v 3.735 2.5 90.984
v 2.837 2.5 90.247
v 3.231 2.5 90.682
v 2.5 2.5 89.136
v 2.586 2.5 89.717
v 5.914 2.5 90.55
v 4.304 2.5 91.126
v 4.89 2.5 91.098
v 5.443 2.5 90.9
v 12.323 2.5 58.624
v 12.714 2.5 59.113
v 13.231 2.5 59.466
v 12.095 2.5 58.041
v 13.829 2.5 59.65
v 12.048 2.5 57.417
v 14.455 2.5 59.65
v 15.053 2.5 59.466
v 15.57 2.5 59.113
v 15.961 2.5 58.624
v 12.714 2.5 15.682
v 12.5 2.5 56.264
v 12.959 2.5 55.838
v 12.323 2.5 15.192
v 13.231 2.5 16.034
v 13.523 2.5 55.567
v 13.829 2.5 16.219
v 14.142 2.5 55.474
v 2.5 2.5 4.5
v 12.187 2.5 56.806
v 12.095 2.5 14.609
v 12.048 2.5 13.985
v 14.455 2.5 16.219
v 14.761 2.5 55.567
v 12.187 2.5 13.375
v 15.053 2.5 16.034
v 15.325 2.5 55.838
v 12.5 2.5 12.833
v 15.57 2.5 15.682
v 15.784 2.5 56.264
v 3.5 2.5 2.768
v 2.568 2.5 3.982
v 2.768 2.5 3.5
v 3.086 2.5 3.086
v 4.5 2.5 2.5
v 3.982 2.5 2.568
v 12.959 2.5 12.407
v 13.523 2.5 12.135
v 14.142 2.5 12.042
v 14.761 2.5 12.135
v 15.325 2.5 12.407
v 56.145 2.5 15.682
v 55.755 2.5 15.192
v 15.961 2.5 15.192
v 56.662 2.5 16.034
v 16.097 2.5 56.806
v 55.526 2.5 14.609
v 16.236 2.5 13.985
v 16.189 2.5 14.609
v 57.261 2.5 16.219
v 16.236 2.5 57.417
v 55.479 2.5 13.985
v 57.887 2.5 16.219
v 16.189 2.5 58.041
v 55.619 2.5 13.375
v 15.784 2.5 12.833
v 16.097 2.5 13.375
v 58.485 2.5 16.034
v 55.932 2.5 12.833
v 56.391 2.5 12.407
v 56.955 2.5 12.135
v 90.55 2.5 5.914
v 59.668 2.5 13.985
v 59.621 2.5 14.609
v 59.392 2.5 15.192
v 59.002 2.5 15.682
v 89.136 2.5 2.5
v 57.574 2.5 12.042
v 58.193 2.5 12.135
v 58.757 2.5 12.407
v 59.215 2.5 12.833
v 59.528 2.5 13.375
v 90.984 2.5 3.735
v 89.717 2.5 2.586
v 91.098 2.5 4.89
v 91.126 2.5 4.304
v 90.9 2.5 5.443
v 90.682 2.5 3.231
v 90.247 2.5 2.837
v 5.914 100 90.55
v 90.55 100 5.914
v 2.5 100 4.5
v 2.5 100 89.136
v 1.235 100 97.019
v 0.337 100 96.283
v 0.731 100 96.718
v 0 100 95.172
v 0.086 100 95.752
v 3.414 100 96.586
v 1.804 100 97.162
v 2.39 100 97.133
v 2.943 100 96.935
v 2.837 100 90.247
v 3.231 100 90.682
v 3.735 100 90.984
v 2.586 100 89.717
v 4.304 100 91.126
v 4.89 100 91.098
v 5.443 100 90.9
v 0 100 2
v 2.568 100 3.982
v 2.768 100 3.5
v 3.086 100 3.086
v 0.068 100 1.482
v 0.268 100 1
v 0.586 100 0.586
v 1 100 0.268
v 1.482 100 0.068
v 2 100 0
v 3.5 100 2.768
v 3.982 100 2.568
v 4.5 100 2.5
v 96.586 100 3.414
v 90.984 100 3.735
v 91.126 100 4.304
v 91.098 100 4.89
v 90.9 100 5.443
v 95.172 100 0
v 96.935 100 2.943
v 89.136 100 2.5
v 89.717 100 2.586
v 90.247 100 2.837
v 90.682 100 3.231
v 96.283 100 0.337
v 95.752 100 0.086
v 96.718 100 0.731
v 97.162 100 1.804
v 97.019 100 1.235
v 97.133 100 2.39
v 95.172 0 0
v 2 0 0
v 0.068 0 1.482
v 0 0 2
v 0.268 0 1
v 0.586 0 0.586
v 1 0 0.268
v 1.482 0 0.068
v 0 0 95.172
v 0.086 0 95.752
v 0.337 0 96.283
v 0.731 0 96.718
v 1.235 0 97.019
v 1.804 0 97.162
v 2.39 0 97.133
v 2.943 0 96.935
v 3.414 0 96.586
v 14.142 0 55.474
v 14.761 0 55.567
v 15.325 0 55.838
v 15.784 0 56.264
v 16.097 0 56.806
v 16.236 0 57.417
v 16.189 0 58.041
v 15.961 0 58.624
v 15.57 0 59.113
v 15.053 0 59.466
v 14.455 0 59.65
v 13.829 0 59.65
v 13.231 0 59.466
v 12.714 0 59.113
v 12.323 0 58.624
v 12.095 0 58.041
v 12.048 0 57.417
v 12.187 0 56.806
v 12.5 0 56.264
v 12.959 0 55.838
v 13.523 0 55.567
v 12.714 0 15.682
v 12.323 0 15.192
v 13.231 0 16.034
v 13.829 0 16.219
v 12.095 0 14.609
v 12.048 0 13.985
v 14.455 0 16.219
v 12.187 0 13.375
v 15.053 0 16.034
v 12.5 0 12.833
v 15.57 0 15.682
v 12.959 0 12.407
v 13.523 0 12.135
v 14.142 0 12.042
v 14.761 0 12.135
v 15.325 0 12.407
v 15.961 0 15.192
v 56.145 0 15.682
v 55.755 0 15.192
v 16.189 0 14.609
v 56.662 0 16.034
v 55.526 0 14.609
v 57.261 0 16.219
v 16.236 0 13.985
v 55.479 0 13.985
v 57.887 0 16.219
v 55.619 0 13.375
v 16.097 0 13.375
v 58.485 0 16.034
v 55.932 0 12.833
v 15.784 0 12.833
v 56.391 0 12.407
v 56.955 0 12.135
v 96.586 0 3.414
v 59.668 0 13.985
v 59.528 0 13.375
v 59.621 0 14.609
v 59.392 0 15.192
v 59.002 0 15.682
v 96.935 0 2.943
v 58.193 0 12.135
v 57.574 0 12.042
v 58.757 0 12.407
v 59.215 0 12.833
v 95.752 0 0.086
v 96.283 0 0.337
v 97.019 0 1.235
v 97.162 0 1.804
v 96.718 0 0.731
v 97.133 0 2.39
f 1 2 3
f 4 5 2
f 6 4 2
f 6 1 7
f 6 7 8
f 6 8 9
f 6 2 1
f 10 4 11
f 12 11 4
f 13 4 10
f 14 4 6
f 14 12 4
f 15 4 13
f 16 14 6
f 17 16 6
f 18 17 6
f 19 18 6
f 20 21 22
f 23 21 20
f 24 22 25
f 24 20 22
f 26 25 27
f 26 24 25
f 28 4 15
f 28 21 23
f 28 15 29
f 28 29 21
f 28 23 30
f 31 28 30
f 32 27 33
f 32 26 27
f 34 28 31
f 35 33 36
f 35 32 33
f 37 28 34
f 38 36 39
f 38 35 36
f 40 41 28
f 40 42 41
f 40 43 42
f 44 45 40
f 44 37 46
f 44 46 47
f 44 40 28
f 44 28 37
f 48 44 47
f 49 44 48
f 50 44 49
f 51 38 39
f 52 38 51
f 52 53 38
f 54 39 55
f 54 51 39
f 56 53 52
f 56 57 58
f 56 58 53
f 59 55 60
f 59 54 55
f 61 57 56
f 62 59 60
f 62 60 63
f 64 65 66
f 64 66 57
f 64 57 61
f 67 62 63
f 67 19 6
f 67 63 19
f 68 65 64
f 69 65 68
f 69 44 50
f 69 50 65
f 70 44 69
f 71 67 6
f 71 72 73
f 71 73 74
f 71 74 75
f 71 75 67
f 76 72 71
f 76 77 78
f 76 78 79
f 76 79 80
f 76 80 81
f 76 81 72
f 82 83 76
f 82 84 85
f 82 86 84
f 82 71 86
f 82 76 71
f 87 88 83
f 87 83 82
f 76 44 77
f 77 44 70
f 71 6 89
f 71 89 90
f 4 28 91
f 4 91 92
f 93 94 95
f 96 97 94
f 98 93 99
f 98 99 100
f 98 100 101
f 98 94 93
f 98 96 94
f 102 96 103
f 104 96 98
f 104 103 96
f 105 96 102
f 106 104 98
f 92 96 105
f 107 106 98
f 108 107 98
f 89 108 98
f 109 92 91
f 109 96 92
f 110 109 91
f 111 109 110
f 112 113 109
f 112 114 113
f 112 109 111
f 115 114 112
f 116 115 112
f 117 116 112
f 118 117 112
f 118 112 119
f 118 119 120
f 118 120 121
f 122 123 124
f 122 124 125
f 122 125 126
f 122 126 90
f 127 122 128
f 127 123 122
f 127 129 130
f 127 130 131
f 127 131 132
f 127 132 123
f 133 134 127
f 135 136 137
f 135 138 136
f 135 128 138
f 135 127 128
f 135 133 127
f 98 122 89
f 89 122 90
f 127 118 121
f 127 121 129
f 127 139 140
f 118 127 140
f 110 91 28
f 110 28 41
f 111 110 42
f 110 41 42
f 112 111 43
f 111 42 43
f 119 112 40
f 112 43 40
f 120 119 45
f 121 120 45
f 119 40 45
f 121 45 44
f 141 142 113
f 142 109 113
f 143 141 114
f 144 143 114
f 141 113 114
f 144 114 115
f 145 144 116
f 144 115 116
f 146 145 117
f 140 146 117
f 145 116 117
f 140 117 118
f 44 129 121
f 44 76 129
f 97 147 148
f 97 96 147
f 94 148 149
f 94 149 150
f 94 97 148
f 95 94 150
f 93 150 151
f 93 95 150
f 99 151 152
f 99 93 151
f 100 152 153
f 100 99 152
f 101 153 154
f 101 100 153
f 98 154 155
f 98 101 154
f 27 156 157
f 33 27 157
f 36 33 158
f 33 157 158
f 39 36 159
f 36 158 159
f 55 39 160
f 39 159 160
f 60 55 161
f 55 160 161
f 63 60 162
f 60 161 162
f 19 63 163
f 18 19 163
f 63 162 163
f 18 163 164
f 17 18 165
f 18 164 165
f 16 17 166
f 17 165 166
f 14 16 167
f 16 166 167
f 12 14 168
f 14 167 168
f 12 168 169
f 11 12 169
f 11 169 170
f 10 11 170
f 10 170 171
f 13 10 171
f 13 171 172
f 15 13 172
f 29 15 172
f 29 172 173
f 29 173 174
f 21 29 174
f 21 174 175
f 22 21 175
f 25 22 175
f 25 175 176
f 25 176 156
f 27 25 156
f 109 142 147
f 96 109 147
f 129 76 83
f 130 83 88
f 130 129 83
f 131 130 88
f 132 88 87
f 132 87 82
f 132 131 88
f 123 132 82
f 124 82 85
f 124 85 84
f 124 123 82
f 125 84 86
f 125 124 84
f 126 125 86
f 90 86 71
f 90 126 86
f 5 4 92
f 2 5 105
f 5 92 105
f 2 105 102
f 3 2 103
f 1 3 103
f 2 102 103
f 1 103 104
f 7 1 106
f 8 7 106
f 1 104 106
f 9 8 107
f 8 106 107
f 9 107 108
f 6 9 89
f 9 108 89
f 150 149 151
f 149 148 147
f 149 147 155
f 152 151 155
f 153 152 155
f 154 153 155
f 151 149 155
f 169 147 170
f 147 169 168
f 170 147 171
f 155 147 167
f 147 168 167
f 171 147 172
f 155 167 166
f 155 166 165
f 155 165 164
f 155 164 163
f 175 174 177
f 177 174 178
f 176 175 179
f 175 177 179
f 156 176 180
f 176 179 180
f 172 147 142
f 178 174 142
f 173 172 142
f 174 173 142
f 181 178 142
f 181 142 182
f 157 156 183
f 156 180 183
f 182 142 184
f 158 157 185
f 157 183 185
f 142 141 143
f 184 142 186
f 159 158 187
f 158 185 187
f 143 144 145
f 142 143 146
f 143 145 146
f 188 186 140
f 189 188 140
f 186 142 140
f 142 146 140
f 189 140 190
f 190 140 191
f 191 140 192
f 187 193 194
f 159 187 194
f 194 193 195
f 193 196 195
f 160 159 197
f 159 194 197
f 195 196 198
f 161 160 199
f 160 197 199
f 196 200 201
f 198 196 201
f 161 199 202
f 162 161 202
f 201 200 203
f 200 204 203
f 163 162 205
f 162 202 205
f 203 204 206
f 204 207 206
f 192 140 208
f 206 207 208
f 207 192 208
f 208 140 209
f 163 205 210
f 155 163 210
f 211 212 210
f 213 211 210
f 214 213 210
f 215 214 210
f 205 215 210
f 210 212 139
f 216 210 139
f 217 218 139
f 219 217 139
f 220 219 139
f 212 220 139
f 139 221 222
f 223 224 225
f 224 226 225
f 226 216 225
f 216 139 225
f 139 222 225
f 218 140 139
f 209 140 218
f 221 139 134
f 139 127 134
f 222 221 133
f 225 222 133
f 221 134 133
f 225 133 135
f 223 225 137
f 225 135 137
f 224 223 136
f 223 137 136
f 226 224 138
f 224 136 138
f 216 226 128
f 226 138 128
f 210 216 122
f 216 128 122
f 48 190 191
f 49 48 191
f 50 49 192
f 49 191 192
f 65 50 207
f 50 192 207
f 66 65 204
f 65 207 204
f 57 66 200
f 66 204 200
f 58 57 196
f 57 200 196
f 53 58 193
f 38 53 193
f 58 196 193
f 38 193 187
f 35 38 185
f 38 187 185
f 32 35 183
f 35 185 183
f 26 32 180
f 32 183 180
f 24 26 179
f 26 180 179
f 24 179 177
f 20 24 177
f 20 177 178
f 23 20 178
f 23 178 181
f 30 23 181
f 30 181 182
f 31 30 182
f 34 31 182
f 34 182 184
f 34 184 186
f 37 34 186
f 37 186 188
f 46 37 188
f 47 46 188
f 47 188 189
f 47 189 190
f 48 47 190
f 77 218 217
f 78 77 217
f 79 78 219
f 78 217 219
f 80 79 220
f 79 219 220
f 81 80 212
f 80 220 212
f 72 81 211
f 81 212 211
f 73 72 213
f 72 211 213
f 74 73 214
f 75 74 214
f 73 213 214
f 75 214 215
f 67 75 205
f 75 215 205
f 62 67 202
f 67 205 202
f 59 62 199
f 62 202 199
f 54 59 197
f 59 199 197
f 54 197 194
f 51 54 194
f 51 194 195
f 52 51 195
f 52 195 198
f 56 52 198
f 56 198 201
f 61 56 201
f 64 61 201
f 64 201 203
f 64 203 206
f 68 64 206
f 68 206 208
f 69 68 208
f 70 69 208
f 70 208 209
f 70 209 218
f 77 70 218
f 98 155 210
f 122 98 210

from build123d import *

# Parameters (mm, degrees)
BOSS_EXTRUDE1_DEPTH         = 100
SHELL1_T                    = -2.5
TAP_DRILL_FOR_M5X0_8_TAP1_D = 4.2
FILLET1_R                   = 2


with BuildPart() as part:
    # Sketch1 → Boss-Extrude1 (new body)
    with BuildSketch(Plane(origin=(0, 0, 0), x_dir=(1, 0, 0), z_dir=(0, 1, 0))):
        Polygon((0, 0), (0, -100), (100, 0), align=None)
    extrude(amount=BOSS_EXTRUDE1_DEPTH)

    # Shell1
    shell1_openings = [part.faces().sort_by_distance(p)[0] for p in [
        (33.333333333, 100, 33.333333333),
    ]]
    offset(amount=SHELL1_T, openings=shell1_openings, kind=Kind.INTERSECTION)

    # Tap Drill for M5x0.8 Tap1 (through all)
    with Locations(Plane(origin=(14.142135624, 2.5, 14.142135624), x_dir=(0, 0, 1), z_dir=(0, 1, 0))):
        with Locations((0, 0), (43.431457505, 0), (0, 43.431457505)):
            Hole(TAP_DRILL_FOR_M5X0_8_TAP1_D / 2)

    # Fillet1
    fillet1_edges = [part.edges().sort_by_distance(p)[0] for p in [
        (93.964466094, 51.25, 2.5),
        (2.5, 51.25, 2.5),
        (2.5, 51.25, 93.964466094),
        (100, 50, 0),
        (0, 50, 100),
        (0, 50, 0),
    ]]
    fillet(fillet1_edges, radius=FILLET1_R)


solid = part.part
